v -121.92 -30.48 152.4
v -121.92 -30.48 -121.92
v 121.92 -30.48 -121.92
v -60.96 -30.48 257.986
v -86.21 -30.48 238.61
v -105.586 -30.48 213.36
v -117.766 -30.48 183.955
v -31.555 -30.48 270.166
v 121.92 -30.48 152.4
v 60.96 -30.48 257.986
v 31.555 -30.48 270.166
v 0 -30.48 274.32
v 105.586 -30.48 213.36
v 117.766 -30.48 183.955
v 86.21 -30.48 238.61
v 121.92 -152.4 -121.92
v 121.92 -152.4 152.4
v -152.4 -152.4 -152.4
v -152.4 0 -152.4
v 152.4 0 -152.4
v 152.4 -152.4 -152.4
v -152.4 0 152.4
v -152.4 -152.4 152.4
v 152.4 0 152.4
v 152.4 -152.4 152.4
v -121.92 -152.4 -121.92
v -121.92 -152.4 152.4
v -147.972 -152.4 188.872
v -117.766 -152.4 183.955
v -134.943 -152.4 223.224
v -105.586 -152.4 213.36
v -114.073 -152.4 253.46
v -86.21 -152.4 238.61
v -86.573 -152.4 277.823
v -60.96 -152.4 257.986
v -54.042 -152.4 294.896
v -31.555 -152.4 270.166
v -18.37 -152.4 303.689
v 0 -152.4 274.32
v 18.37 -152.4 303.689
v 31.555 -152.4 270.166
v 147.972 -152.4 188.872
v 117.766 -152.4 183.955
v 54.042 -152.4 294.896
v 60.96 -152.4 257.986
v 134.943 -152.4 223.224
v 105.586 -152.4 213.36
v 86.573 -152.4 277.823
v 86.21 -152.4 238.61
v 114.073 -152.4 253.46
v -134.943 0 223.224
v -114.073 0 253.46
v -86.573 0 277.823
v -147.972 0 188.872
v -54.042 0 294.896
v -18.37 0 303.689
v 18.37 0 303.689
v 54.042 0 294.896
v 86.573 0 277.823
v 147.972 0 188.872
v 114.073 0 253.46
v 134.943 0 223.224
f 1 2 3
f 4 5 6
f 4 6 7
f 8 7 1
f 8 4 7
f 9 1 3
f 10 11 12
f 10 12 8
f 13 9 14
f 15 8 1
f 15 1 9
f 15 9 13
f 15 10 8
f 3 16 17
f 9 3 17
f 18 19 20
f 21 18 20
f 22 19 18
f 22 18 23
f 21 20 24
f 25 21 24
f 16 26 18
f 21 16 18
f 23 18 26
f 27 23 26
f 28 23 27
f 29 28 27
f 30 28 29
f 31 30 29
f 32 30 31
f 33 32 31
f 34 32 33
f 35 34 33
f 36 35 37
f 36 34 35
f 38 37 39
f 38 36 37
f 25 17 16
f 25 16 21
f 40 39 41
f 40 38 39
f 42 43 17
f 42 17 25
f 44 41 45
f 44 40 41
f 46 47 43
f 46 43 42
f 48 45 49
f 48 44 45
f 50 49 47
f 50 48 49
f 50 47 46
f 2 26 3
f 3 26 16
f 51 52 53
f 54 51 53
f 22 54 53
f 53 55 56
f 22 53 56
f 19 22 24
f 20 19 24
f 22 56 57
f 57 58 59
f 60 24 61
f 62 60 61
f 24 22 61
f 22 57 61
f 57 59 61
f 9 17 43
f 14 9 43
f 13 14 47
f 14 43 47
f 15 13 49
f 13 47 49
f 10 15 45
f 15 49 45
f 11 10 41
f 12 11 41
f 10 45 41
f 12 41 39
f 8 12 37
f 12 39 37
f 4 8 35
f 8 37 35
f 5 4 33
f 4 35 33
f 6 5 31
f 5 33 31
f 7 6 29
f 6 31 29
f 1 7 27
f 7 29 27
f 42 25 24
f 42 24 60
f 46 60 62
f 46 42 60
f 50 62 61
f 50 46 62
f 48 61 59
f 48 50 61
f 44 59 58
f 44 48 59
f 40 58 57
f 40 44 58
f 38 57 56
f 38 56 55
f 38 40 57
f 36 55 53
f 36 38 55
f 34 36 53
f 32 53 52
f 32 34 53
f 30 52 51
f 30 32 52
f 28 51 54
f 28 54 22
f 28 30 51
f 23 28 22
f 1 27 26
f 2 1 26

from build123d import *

# Parameters (mm, degrees)
F0_W     = 304.8
F0_H     = 304.8
F1_DEPTH = 152.4
F3_DEPTH = 152.4
F5_DEPTH = 121.92


with BuildPart() as f1:
    # F0 (on Front) → F1 (new body)
    with BuildSketch(Plane.XZ):
        Rectangle(F0_W, F0_H)
    extrude(amount=F1_DEPTH)

    # F2 (on face) → F3 (join)
    with BuildSketch(Plane.XZ.offset(152.4)):
        with BuildLine():
            Line((-152.4, 152.4), (152.4, 152.4))
            ThreePointArc((152.4, 152.4), (0, 304.8), (-152.4, 152.4))
        make_face()
    extrude(amount=-F3_DEPTH)

    # F4 (on face) → F5 (cut)
    with BuildSketch(Plane.XZ.offset(152.4)):
        with BuildLine():
            Line((-121.92, 152.4), (-121.92, -121.92))
            Line((-121.92, -121.92), (121.92, -121.92))
            Line((121.92, -121.92), (121.92, 152.4))
            ThreePointArc((121.92, 152.4), (0, 274.32), (-121.92, 152.4))
        make_face()
    extrude(amount=-F5_DEPTH, mode=Mode.SUBTRACT)


solid = f1.part
